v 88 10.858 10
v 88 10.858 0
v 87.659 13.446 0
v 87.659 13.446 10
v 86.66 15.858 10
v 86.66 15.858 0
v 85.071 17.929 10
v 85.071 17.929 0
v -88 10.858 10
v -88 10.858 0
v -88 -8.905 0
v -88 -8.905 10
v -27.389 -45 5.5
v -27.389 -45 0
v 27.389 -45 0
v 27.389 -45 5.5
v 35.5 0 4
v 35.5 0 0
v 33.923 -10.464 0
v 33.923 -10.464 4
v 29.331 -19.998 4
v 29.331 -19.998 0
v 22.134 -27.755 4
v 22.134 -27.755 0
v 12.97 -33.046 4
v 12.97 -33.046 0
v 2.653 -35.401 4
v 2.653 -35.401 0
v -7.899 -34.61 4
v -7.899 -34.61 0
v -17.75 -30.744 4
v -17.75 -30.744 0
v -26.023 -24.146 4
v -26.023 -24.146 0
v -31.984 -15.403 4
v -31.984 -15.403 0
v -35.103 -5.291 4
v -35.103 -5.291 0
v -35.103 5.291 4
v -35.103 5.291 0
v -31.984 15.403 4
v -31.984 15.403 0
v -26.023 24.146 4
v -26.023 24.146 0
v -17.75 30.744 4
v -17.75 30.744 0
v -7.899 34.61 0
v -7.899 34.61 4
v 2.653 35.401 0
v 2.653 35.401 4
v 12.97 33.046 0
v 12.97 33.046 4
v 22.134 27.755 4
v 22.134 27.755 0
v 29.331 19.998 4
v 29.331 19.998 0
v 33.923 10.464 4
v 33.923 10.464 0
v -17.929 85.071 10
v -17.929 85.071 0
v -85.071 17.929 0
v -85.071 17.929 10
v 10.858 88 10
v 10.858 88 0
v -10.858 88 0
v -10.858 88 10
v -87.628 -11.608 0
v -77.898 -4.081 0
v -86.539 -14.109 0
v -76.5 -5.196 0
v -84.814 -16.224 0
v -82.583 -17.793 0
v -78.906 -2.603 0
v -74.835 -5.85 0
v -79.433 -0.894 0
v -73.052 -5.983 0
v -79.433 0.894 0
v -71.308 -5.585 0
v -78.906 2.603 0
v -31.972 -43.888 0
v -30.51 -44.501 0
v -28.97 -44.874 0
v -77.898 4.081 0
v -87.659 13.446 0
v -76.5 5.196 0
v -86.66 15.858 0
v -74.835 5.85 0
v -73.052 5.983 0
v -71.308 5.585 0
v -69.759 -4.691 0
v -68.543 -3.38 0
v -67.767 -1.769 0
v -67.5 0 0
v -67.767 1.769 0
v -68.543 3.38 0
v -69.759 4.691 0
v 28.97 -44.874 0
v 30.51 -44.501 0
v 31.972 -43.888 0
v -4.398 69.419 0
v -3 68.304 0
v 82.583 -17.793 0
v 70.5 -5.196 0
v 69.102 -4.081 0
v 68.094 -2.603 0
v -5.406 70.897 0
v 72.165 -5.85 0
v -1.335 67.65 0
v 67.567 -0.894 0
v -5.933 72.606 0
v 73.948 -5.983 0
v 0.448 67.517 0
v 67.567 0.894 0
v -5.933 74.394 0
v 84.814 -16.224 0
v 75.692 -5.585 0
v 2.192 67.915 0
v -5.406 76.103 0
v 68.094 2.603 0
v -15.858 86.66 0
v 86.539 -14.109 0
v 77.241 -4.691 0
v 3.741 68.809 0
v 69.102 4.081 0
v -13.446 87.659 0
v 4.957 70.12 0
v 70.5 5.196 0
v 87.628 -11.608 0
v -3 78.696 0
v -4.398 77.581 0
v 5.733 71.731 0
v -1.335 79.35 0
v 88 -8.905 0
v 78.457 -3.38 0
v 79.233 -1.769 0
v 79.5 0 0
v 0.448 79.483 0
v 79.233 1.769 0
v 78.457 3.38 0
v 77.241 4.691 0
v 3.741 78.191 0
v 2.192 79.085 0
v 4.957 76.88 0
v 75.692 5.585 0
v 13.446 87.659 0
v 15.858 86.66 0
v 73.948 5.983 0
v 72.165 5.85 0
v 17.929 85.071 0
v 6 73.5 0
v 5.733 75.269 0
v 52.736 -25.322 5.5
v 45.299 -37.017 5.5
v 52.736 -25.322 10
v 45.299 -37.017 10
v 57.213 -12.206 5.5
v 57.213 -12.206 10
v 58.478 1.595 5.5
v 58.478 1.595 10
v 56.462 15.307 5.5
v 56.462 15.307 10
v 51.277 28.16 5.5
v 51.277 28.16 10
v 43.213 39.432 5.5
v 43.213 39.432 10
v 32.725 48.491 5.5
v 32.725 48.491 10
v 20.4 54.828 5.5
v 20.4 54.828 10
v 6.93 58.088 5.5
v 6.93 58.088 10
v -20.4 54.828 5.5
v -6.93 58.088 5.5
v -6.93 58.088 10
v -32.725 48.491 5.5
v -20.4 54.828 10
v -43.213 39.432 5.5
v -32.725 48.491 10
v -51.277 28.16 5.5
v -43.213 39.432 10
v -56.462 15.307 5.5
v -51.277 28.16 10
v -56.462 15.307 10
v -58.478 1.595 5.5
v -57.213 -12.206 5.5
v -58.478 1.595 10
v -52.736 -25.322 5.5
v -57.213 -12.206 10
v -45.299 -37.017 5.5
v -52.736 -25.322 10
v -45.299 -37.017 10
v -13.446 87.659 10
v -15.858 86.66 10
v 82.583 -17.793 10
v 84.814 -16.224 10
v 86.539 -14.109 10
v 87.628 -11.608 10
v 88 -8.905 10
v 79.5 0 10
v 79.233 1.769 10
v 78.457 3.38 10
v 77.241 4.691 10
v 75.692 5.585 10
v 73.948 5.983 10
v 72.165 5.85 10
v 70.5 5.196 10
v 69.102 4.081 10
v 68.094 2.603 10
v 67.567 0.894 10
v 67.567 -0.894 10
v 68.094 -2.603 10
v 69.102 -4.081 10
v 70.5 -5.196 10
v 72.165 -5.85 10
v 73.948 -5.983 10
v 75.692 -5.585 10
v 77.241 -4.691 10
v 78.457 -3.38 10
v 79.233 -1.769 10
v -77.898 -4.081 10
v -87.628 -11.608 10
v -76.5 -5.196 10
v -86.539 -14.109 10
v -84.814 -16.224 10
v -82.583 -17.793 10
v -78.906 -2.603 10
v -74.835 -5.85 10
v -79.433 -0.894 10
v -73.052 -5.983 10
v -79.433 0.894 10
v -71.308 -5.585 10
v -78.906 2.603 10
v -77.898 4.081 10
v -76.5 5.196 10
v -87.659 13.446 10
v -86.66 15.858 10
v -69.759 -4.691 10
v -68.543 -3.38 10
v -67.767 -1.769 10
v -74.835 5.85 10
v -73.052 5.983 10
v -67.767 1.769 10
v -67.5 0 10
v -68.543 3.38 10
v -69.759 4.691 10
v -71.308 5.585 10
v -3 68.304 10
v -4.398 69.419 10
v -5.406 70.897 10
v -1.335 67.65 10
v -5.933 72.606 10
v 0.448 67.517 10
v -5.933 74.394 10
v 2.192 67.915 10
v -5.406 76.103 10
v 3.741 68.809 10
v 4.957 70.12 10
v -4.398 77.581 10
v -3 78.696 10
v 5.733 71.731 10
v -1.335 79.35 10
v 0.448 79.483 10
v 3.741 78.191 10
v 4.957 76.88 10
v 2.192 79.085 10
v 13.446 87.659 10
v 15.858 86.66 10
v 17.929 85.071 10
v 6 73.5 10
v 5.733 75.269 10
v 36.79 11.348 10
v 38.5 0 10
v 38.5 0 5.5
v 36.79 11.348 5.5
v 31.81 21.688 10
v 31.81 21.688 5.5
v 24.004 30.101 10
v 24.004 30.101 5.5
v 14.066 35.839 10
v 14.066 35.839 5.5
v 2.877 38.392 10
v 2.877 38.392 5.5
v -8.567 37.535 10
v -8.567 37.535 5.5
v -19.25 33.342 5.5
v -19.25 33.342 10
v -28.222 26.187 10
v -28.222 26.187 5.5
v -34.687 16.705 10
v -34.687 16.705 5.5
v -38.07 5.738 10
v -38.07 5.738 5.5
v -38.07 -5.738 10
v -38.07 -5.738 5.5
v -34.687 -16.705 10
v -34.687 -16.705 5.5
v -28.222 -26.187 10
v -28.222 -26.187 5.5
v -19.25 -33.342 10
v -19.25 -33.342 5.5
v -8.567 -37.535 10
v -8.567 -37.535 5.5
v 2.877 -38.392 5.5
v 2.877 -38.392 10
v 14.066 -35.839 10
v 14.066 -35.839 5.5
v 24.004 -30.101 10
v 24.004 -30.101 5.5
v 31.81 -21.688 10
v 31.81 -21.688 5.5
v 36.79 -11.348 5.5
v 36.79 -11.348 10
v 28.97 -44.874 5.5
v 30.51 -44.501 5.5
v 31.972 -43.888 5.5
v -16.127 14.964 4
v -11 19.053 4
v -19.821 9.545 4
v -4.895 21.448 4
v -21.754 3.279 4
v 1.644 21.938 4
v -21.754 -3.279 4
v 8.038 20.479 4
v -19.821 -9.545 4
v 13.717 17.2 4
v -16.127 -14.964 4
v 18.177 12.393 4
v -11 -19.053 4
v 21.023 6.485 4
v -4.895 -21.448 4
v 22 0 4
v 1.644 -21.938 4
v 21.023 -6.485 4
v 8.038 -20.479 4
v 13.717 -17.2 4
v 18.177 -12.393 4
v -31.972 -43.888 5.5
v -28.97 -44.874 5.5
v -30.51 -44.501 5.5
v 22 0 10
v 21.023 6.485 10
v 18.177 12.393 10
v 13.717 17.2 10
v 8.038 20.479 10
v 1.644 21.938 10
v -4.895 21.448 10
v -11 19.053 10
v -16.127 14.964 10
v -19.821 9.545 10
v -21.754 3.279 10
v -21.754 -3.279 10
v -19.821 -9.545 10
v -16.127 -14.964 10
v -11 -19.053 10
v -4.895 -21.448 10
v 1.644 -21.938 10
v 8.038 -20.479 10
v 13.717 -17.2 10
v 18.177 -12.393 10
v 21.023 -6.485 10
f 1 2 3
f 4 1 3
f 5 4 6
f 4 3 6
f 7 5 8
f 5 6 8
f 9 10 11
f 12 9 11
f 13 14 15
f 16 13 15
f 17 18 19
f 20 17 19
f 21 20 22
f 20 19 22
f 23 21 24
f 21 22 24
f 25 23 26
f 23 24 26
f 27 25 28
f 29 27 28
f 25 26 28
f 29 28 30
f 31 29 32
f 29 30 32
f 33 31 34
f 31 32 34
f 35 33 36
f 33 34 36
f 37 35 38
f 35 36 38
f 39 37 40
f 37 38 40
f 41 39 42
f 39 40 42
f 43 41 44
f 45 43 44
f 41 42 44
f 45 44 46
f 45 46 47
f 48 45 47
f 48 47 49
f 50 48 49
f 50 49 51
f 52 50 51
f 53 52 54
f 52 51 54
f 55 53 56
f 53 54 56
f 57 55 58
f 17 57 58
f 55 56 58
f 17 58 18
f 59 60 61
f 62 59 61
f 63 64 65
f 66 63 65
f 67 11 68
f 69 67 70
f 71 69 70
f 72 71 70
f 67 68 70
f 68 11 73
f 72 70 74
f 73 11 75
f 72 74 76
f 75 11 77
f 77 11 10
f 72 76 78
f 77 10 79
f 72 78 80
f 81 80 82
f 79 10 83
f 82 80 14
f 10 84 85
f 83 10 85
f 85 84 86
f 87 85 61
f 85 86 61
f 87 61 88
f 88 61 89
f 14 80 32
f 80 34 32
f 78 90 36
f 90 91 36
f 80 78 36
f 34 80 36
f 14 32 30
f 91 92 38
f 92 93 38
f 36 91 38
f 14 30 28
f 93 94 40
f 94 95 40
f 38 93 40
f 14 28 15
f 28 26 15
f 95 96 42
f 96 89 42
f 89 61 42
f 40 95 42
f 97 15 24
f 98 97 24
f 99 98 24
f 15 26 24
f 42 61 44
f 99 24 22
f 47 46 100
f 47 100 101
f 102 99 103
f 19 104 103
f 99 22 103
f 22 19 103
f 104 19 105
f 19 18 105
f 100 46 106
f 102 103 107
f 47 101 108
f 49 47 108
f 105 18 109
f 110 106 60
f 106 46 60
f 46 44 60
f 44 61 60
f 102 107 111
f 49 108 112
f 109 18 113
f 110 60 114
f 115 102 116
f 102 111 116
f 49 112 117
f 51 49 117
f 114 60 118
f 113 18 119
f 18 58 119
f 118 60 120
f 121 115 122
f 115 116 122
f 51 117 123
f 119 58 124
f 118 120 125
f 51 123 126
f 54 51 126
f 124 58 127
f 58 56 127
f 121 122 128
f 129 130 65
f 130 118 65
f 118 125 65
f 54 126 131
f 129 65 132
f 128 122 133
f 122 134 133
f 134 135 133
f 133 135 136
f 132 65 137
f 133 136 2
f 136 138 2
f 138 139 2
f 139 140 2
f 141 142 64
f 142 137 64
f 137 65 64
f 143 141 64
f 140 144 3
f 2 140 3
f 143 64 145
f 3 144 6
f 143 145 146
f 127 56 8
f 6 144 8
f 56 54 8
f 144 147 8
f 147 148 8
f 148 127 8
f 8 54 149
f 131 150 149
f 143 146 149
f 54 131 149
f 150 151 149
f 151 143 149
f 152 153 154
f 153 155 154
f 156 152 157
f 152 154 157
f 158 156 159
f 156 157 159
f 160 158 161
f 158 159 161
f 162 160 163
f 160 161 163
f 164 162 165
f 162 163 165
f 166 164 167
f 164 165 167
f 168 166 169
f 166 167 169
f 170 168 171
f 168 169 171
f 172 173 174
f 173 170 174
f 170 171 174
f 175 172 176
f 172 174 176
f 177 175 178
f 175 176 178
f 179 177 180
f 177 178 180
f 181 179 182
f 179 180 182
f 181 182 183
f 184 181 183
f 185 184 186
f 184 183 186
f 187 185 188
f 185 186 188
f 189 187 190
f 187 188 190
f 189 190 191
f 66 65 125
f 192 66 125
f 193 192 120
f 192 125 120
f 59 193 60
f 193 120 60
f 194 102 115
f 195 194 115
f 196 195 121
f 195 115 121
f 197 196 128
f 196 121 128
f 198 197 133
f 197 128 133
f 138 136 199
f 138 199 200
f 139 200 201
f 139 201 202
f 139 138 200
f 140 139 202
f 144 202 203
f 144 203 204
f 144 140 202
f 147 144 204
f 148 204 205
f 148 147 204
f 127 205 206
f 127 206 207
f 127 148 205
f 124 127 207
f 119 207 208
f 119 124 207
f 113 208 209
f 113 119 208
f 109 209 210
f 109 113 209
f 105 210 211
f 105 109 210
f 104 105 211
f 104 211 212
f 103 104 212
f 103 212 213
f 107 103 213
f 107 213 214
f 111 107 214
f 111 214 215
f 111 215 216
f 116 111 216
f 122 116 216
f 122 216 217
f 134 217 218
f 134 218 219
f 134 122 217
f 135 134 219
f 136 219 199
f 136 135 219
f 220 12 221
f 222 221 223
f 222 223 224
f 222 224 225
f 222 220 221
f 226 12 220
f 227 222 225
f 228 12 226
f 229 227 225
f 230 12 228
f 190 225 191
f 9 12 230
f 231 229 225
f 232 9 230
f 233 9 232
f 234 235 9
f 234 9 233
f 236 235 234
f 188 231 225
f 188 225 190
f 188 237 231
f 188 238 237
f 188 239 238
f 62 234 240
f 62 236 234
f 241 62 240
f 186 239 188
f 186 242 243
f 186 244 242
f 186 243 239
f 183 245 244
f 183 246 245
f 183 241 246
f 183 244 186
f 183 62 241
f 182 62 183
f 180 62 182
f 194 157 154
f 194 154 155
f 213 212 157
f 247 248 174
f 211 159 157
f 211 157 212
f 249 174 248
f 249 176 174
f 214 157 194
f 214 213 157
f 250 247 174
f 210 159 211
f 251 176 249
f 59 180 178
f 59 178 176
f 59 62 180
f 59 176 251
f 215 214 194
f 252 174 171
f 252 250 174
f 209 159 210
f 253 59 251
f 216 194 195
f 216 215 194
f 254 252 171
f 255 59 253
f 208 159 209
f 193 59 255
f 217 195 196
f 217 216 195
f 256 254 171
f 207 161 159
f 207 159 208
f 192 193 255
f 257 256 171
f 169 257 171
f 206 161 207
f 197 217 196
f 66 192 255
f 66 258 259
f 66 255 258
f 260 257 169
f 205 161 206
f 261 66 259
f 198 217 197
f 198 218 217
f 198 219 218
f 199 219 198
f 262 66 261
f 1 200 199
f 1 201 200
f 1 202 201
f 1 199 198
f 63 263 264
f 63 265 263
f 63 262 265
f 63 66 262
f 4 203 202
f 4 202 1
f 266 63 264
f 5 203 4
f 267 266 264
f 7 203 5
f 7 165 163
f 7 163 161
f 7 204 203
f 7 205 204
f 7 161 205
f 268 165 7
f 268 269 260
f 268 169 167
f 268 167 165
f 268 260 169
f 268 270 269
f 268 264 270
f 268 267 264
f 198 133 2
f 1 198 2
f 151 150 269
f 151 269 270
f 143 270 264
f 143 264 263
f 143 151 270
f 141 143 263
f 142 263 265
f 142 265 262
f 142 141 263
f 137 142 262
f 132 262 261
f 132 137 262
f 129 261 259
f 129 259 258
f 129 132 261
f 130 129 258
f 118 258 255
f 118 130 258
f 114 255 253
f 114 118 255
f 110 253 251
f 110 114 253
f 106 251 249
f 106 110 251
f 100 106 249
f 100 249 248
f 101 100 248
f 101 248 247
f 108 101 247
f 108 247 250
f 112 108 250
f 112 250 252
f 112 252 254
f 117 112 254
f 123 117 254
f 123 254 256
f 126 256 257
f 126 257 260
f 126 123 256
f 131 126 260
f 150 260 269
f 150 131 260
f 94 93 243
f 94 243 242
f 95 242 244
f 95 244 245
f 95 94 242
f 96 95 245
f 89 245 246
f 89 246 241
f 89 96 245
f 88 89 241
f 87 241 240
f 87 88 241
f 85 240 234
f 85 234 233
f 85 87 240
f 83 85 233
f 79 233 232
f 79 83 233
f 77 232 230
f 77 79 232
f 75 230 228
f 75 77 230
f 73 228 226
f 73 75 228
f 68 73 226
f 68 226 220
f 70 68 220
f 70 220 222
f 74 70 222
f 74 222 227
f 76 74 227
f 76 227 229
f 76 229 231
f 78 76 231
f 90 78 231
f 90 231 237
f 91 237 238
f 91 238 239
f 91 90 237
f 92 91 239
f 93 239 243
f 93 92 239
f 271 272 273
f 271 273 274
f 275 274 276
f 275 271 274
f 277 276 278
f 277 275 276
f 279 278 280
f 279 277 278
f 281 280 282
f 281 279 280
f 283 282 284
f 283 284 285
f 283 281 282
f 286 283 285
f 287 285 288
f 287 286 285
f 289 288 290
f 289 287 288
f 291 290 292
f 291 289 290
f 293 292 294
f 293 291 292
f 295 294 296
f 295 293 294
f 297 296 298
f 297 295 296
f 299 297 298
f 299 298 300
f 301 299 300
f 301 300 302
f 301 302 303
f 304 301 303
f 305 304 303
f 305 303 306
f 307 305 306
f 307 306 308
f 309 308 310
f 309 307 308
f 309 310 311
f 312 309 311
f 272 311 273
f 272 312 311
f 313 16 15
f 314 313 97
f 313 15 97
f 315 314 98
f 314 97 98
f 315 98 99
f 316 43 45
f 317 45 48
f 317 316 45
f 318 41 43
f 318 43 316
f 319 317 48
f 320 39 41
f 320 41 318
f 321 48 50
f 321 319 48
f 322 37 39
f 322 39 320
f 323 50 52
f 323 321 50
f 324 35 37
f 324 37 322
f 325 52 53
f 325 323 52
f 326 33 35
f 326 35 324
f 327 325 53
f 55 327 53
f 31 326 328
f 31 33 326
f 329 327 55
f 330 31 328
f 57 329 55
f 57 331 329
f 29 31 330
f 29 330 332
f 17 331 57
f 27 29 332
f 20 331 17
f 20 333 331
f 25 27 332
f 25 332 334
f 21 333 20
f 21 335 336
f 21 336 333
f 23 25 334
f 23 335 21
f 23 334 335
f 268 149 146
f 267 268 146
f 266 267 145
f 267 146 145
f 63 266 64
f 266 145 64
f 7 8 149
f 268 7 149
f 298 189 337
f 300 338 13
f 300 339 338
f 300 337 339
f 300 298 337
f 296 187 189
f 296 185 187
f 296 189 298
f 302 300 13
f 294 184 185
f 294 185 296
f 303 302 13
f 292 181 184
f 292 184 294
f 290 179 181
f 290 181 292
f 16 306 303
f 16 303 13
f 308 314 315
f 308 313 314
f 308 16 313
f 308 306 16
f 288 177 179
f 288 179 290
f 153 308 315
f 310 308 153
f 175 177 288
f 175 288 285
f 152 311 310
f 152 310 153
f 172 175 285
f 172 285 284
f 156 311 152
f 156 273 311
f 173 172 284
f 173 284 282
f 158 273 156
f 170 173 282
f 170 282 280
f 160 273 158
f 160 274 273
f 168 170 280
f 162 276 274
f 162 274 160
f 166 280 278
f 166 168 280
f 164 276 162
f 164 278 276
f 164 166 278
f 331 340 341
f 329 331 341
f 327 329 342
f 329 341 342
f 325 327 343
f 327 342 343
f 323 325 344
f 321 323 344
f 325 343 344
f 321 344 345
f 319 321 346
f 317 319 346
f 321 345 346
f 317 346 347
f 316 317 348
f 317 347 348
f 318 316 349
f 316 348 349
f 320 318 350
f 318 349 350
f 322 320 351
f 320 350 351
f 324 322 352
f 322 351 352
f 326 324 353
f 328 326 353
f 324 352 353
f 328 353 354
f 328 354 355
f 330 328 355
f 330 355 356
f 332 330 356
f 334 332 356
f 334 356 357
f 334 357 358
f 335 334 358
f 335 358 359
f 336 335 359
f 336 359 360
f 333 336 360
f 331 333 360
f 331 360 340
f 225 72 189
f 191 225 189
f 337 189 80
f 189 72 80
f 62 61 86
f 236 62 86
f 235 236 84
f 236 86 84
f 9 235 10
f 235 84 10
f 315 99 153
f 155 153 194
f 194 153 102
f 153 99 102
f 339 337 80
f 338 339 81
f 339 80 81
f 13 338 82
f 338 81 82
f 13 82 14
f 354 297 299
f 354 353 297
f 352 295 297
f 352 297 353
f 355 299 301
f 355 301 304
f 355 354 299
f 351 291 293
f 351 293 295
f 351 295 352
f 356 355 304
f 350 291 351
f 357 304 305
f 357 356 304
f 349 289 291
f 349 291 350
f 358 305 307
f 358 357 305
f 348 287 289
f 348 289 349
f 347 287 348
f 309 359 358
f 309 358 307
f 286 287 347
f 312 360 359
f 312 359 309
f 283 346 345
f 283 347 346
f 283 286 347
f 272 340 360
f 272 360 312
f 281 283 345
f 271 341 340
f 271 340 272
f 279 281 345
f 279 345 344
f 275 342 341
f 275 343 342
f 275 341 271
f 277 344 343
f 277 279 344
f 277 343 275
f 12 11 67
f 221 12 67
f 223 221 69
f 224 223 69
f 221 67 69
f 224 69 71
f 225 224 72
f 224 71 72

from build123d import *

# Parameters (mm, degrees)
F0_R     = 6
F1_DEPTH = 10
F2_R     = 35.5
F3_DEPTH = 4
F4_R     = 58.5
F4_R_2   = 38.5
F5_DEPTH = 4.5
F6_R     = 22
F7_DEPTH = 10.001


with BuildPart() as f1:
    # F0 (on Top) → F1 (new body)
    with BuildSketch(Plane.XY):
        with BuildLine():
            ThreePointArc((-85.071068, 17.928932), (-87.238795, 14.684699), (-88, 10.857864))
            Line((-88, 10.857864), (-88, -8.905047))
            ThreePointArc((-88, -8.905047), (-86.538952, -14.109498), (-82.582739, -17.793158))
            Line((-82.582739, -17.793158), (-31.972211, -43.88811))
            ThreePointArc((-31.972211, -43.88811), (-29.747321, -44.718053), (-27.389472, -45))
            Line((-27.389472, -45), (0, -45))
            Line((0, -45), (27.389472, -45))
            ThreePointArc((27.389472, -45), (29.747321, -44.718053), (31.972211, -43.88811))
            Line((31.972211, -43.88811), (82.582739, -17.793158))
            ThreePointArc((82.582739, -17.793158), (86.538952, -14.109498), (88, -8.905047))
            Line((88, -8.905047), (88, 10.857864))
            ThreePointArc((88, 10.857864), (87.238795, 14.684699), (85.071068, 17.928932))
            Line((85.071068, 17.928932), (17.928932, 85.071068))
            ThreePointArc((17.928932, 85.071068), (14.684699, 87.238795), (10.857864, 88))
            Line((10.857864, 88), (-10.857864, 88))
            ThreePointArc((-10.857864, 88), (-14.684699, 87.238795), (-17.928932, 85.071068))
            Line((-17.928932, 85.071068), (-85.071068, 17.928932))
        make_face()
        with Locations((-73.5, 0)):
            Circle(F0_R, mode=Mode.SUBTRACT)
        with Locations((73.5, 0)):
            Circle(F0_R, mode=Mode.SUBTRACT)
        with Locations((0, 73.5)):
            Circle(F0_R, mode=Mode.SUBTRACT)
    extrude(amount=F1_DEPTH)

    # F2 (on face) → F3 (cut)
    with BuildSketch(Plane(origin=(0, 0, 0), x_dir=(1, 0, 0), z_dir=(0, 0, -1))):
        Circle(F2_R)
    extrude(amount=-F3_DEPTH, mode=Mode.SUBTRACT)

    # F4 (on face) → F5 (cut)
    with BuildSketch(Plane.XY.offset(10)):
        Circle(F4_R)
        Circle(F4_R_2, mode=Mode.SUBTRACT)
    extrude(amount=-F5_DEPTH, mode=Mode.SUBTRACT)

    # F6 (on face) → F7 (cut, through all)
    with BuildSketch(Plane.XY.offset(10)):
        Circle(F6_R)
    extrude(amount=-F7_DEPTH, mode=Mode.SUBTRACT)


solid = f1.part
